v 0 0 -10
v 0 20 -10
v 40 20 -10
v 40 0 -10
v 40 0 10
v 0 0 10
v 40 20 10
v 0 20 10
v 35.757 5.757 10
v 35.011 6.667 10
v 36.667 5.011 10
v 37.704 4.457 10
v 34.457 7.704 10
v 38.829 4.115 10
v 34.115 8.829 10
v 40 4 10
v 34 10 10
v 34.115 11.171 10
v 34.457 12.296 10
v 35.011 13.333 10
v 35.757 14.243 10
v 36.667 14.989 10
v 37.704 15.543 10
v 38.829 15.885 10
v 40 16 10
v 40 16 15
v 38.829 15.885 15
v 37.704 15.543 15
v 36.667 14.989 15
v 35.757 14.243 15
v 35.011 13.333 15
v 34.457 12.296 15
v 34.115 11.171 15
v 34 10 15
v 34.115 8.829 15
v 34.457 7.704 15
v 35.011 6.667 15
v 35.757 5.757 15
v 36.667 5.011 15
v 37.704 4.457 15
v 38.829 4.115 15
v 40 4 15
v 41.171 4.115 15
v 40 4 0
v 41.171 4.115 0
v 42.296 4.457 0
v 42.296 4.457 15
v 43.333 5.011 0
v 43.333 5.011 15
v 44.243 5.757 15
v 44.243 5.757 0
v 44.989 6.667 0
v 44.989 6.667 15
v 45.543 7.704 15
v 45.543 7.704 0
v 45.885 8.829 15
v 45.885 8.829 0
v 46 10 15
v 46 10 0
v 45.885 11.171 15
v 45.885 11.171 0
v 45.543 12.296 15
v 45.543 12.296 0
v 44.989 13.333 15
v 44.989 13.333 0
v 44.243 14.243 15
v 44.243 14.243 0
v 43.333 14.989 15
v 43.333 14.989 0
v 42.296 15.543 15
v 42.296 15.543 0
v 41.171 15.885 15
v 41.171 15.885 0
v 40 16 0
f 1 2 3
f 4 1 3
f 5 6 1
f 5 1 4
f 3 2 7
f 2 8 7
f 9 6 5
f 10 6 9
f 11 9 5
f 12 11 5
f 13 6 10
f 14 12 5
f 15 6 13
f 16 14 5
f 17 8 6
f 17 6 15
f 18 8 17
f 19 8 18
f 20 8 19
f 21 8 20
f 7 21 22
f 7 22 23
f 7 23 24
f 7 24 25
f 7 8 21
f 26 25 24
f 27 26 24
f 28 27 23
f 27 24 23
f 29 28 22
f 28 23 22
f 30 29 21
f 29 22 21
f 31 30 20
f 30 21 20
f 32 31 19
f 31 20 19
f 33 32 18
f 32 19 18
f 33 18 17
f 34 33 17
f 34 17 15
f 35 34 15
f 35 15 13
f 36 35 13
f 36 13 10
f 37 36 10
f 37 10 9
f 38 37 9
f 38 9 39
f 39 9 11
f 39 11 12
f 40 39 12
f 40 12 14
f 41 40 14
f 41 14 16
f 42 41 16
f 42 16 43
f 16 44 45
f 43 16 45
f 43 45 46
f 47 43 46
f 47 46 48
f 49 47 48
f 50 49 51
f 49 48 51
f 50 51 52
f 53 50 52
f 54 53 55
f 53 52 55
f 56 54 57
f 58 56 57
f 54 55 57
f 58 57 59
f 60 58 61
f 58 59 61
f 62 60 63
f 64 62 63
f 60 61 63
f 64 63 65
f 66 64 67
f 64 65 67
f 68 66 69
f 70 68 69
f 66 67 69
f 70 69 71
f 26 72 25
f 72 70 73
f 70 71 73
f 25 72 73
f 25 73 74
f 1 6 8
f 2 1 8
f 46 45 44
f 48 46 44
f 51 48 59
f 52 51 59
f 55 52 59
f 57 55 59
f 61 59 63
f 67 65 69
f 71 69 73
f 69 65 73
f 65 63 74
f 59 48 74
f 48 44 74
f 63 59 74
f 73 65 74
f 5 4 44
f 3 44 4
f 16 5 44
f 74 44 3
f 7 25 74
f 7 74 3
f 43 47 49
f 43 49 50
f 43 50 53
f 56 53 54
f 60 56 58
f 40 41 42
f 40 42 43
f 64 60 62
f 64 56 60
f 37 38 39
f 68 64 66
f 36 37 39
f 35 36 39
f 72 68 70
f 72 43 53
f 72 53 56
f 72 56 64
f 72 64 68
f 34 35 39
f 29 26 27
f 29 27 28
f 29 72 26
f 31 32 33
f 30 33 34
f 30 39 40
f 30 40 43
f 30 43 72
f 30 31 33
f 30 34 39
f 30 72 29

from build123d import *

# Parameters (mm, degrees)
SKETCH1_W           = 40
SKETCH1_H           = 20
BOSS_EXTRUDE1_DEPTH = 10
SKETCH2_R           = 6
BOSS_EXTRUDE2_DEPTH = 15


with BuildPart() as part:
    # Sketch1 → Boss-Extrude1 (new, symmetric)
    with BuildSketch(Plane.XY):
        with Locations((20, 10)):
            Rectangle(SKETCH1_W, SKETCH1_H)
    extrude(amount=BOSS_EXTRUDE1_DEPTH, both=True)

    # Sketch2 → Boss-Extrude2 (add)
    with BuildSketch(Plane.XY):
        with Locations((40, 10)):
            Circle(SKETCH2_R)
    extrude(amount=BOSS_EXTRUDE2_DEPTH)


solid = part.part
